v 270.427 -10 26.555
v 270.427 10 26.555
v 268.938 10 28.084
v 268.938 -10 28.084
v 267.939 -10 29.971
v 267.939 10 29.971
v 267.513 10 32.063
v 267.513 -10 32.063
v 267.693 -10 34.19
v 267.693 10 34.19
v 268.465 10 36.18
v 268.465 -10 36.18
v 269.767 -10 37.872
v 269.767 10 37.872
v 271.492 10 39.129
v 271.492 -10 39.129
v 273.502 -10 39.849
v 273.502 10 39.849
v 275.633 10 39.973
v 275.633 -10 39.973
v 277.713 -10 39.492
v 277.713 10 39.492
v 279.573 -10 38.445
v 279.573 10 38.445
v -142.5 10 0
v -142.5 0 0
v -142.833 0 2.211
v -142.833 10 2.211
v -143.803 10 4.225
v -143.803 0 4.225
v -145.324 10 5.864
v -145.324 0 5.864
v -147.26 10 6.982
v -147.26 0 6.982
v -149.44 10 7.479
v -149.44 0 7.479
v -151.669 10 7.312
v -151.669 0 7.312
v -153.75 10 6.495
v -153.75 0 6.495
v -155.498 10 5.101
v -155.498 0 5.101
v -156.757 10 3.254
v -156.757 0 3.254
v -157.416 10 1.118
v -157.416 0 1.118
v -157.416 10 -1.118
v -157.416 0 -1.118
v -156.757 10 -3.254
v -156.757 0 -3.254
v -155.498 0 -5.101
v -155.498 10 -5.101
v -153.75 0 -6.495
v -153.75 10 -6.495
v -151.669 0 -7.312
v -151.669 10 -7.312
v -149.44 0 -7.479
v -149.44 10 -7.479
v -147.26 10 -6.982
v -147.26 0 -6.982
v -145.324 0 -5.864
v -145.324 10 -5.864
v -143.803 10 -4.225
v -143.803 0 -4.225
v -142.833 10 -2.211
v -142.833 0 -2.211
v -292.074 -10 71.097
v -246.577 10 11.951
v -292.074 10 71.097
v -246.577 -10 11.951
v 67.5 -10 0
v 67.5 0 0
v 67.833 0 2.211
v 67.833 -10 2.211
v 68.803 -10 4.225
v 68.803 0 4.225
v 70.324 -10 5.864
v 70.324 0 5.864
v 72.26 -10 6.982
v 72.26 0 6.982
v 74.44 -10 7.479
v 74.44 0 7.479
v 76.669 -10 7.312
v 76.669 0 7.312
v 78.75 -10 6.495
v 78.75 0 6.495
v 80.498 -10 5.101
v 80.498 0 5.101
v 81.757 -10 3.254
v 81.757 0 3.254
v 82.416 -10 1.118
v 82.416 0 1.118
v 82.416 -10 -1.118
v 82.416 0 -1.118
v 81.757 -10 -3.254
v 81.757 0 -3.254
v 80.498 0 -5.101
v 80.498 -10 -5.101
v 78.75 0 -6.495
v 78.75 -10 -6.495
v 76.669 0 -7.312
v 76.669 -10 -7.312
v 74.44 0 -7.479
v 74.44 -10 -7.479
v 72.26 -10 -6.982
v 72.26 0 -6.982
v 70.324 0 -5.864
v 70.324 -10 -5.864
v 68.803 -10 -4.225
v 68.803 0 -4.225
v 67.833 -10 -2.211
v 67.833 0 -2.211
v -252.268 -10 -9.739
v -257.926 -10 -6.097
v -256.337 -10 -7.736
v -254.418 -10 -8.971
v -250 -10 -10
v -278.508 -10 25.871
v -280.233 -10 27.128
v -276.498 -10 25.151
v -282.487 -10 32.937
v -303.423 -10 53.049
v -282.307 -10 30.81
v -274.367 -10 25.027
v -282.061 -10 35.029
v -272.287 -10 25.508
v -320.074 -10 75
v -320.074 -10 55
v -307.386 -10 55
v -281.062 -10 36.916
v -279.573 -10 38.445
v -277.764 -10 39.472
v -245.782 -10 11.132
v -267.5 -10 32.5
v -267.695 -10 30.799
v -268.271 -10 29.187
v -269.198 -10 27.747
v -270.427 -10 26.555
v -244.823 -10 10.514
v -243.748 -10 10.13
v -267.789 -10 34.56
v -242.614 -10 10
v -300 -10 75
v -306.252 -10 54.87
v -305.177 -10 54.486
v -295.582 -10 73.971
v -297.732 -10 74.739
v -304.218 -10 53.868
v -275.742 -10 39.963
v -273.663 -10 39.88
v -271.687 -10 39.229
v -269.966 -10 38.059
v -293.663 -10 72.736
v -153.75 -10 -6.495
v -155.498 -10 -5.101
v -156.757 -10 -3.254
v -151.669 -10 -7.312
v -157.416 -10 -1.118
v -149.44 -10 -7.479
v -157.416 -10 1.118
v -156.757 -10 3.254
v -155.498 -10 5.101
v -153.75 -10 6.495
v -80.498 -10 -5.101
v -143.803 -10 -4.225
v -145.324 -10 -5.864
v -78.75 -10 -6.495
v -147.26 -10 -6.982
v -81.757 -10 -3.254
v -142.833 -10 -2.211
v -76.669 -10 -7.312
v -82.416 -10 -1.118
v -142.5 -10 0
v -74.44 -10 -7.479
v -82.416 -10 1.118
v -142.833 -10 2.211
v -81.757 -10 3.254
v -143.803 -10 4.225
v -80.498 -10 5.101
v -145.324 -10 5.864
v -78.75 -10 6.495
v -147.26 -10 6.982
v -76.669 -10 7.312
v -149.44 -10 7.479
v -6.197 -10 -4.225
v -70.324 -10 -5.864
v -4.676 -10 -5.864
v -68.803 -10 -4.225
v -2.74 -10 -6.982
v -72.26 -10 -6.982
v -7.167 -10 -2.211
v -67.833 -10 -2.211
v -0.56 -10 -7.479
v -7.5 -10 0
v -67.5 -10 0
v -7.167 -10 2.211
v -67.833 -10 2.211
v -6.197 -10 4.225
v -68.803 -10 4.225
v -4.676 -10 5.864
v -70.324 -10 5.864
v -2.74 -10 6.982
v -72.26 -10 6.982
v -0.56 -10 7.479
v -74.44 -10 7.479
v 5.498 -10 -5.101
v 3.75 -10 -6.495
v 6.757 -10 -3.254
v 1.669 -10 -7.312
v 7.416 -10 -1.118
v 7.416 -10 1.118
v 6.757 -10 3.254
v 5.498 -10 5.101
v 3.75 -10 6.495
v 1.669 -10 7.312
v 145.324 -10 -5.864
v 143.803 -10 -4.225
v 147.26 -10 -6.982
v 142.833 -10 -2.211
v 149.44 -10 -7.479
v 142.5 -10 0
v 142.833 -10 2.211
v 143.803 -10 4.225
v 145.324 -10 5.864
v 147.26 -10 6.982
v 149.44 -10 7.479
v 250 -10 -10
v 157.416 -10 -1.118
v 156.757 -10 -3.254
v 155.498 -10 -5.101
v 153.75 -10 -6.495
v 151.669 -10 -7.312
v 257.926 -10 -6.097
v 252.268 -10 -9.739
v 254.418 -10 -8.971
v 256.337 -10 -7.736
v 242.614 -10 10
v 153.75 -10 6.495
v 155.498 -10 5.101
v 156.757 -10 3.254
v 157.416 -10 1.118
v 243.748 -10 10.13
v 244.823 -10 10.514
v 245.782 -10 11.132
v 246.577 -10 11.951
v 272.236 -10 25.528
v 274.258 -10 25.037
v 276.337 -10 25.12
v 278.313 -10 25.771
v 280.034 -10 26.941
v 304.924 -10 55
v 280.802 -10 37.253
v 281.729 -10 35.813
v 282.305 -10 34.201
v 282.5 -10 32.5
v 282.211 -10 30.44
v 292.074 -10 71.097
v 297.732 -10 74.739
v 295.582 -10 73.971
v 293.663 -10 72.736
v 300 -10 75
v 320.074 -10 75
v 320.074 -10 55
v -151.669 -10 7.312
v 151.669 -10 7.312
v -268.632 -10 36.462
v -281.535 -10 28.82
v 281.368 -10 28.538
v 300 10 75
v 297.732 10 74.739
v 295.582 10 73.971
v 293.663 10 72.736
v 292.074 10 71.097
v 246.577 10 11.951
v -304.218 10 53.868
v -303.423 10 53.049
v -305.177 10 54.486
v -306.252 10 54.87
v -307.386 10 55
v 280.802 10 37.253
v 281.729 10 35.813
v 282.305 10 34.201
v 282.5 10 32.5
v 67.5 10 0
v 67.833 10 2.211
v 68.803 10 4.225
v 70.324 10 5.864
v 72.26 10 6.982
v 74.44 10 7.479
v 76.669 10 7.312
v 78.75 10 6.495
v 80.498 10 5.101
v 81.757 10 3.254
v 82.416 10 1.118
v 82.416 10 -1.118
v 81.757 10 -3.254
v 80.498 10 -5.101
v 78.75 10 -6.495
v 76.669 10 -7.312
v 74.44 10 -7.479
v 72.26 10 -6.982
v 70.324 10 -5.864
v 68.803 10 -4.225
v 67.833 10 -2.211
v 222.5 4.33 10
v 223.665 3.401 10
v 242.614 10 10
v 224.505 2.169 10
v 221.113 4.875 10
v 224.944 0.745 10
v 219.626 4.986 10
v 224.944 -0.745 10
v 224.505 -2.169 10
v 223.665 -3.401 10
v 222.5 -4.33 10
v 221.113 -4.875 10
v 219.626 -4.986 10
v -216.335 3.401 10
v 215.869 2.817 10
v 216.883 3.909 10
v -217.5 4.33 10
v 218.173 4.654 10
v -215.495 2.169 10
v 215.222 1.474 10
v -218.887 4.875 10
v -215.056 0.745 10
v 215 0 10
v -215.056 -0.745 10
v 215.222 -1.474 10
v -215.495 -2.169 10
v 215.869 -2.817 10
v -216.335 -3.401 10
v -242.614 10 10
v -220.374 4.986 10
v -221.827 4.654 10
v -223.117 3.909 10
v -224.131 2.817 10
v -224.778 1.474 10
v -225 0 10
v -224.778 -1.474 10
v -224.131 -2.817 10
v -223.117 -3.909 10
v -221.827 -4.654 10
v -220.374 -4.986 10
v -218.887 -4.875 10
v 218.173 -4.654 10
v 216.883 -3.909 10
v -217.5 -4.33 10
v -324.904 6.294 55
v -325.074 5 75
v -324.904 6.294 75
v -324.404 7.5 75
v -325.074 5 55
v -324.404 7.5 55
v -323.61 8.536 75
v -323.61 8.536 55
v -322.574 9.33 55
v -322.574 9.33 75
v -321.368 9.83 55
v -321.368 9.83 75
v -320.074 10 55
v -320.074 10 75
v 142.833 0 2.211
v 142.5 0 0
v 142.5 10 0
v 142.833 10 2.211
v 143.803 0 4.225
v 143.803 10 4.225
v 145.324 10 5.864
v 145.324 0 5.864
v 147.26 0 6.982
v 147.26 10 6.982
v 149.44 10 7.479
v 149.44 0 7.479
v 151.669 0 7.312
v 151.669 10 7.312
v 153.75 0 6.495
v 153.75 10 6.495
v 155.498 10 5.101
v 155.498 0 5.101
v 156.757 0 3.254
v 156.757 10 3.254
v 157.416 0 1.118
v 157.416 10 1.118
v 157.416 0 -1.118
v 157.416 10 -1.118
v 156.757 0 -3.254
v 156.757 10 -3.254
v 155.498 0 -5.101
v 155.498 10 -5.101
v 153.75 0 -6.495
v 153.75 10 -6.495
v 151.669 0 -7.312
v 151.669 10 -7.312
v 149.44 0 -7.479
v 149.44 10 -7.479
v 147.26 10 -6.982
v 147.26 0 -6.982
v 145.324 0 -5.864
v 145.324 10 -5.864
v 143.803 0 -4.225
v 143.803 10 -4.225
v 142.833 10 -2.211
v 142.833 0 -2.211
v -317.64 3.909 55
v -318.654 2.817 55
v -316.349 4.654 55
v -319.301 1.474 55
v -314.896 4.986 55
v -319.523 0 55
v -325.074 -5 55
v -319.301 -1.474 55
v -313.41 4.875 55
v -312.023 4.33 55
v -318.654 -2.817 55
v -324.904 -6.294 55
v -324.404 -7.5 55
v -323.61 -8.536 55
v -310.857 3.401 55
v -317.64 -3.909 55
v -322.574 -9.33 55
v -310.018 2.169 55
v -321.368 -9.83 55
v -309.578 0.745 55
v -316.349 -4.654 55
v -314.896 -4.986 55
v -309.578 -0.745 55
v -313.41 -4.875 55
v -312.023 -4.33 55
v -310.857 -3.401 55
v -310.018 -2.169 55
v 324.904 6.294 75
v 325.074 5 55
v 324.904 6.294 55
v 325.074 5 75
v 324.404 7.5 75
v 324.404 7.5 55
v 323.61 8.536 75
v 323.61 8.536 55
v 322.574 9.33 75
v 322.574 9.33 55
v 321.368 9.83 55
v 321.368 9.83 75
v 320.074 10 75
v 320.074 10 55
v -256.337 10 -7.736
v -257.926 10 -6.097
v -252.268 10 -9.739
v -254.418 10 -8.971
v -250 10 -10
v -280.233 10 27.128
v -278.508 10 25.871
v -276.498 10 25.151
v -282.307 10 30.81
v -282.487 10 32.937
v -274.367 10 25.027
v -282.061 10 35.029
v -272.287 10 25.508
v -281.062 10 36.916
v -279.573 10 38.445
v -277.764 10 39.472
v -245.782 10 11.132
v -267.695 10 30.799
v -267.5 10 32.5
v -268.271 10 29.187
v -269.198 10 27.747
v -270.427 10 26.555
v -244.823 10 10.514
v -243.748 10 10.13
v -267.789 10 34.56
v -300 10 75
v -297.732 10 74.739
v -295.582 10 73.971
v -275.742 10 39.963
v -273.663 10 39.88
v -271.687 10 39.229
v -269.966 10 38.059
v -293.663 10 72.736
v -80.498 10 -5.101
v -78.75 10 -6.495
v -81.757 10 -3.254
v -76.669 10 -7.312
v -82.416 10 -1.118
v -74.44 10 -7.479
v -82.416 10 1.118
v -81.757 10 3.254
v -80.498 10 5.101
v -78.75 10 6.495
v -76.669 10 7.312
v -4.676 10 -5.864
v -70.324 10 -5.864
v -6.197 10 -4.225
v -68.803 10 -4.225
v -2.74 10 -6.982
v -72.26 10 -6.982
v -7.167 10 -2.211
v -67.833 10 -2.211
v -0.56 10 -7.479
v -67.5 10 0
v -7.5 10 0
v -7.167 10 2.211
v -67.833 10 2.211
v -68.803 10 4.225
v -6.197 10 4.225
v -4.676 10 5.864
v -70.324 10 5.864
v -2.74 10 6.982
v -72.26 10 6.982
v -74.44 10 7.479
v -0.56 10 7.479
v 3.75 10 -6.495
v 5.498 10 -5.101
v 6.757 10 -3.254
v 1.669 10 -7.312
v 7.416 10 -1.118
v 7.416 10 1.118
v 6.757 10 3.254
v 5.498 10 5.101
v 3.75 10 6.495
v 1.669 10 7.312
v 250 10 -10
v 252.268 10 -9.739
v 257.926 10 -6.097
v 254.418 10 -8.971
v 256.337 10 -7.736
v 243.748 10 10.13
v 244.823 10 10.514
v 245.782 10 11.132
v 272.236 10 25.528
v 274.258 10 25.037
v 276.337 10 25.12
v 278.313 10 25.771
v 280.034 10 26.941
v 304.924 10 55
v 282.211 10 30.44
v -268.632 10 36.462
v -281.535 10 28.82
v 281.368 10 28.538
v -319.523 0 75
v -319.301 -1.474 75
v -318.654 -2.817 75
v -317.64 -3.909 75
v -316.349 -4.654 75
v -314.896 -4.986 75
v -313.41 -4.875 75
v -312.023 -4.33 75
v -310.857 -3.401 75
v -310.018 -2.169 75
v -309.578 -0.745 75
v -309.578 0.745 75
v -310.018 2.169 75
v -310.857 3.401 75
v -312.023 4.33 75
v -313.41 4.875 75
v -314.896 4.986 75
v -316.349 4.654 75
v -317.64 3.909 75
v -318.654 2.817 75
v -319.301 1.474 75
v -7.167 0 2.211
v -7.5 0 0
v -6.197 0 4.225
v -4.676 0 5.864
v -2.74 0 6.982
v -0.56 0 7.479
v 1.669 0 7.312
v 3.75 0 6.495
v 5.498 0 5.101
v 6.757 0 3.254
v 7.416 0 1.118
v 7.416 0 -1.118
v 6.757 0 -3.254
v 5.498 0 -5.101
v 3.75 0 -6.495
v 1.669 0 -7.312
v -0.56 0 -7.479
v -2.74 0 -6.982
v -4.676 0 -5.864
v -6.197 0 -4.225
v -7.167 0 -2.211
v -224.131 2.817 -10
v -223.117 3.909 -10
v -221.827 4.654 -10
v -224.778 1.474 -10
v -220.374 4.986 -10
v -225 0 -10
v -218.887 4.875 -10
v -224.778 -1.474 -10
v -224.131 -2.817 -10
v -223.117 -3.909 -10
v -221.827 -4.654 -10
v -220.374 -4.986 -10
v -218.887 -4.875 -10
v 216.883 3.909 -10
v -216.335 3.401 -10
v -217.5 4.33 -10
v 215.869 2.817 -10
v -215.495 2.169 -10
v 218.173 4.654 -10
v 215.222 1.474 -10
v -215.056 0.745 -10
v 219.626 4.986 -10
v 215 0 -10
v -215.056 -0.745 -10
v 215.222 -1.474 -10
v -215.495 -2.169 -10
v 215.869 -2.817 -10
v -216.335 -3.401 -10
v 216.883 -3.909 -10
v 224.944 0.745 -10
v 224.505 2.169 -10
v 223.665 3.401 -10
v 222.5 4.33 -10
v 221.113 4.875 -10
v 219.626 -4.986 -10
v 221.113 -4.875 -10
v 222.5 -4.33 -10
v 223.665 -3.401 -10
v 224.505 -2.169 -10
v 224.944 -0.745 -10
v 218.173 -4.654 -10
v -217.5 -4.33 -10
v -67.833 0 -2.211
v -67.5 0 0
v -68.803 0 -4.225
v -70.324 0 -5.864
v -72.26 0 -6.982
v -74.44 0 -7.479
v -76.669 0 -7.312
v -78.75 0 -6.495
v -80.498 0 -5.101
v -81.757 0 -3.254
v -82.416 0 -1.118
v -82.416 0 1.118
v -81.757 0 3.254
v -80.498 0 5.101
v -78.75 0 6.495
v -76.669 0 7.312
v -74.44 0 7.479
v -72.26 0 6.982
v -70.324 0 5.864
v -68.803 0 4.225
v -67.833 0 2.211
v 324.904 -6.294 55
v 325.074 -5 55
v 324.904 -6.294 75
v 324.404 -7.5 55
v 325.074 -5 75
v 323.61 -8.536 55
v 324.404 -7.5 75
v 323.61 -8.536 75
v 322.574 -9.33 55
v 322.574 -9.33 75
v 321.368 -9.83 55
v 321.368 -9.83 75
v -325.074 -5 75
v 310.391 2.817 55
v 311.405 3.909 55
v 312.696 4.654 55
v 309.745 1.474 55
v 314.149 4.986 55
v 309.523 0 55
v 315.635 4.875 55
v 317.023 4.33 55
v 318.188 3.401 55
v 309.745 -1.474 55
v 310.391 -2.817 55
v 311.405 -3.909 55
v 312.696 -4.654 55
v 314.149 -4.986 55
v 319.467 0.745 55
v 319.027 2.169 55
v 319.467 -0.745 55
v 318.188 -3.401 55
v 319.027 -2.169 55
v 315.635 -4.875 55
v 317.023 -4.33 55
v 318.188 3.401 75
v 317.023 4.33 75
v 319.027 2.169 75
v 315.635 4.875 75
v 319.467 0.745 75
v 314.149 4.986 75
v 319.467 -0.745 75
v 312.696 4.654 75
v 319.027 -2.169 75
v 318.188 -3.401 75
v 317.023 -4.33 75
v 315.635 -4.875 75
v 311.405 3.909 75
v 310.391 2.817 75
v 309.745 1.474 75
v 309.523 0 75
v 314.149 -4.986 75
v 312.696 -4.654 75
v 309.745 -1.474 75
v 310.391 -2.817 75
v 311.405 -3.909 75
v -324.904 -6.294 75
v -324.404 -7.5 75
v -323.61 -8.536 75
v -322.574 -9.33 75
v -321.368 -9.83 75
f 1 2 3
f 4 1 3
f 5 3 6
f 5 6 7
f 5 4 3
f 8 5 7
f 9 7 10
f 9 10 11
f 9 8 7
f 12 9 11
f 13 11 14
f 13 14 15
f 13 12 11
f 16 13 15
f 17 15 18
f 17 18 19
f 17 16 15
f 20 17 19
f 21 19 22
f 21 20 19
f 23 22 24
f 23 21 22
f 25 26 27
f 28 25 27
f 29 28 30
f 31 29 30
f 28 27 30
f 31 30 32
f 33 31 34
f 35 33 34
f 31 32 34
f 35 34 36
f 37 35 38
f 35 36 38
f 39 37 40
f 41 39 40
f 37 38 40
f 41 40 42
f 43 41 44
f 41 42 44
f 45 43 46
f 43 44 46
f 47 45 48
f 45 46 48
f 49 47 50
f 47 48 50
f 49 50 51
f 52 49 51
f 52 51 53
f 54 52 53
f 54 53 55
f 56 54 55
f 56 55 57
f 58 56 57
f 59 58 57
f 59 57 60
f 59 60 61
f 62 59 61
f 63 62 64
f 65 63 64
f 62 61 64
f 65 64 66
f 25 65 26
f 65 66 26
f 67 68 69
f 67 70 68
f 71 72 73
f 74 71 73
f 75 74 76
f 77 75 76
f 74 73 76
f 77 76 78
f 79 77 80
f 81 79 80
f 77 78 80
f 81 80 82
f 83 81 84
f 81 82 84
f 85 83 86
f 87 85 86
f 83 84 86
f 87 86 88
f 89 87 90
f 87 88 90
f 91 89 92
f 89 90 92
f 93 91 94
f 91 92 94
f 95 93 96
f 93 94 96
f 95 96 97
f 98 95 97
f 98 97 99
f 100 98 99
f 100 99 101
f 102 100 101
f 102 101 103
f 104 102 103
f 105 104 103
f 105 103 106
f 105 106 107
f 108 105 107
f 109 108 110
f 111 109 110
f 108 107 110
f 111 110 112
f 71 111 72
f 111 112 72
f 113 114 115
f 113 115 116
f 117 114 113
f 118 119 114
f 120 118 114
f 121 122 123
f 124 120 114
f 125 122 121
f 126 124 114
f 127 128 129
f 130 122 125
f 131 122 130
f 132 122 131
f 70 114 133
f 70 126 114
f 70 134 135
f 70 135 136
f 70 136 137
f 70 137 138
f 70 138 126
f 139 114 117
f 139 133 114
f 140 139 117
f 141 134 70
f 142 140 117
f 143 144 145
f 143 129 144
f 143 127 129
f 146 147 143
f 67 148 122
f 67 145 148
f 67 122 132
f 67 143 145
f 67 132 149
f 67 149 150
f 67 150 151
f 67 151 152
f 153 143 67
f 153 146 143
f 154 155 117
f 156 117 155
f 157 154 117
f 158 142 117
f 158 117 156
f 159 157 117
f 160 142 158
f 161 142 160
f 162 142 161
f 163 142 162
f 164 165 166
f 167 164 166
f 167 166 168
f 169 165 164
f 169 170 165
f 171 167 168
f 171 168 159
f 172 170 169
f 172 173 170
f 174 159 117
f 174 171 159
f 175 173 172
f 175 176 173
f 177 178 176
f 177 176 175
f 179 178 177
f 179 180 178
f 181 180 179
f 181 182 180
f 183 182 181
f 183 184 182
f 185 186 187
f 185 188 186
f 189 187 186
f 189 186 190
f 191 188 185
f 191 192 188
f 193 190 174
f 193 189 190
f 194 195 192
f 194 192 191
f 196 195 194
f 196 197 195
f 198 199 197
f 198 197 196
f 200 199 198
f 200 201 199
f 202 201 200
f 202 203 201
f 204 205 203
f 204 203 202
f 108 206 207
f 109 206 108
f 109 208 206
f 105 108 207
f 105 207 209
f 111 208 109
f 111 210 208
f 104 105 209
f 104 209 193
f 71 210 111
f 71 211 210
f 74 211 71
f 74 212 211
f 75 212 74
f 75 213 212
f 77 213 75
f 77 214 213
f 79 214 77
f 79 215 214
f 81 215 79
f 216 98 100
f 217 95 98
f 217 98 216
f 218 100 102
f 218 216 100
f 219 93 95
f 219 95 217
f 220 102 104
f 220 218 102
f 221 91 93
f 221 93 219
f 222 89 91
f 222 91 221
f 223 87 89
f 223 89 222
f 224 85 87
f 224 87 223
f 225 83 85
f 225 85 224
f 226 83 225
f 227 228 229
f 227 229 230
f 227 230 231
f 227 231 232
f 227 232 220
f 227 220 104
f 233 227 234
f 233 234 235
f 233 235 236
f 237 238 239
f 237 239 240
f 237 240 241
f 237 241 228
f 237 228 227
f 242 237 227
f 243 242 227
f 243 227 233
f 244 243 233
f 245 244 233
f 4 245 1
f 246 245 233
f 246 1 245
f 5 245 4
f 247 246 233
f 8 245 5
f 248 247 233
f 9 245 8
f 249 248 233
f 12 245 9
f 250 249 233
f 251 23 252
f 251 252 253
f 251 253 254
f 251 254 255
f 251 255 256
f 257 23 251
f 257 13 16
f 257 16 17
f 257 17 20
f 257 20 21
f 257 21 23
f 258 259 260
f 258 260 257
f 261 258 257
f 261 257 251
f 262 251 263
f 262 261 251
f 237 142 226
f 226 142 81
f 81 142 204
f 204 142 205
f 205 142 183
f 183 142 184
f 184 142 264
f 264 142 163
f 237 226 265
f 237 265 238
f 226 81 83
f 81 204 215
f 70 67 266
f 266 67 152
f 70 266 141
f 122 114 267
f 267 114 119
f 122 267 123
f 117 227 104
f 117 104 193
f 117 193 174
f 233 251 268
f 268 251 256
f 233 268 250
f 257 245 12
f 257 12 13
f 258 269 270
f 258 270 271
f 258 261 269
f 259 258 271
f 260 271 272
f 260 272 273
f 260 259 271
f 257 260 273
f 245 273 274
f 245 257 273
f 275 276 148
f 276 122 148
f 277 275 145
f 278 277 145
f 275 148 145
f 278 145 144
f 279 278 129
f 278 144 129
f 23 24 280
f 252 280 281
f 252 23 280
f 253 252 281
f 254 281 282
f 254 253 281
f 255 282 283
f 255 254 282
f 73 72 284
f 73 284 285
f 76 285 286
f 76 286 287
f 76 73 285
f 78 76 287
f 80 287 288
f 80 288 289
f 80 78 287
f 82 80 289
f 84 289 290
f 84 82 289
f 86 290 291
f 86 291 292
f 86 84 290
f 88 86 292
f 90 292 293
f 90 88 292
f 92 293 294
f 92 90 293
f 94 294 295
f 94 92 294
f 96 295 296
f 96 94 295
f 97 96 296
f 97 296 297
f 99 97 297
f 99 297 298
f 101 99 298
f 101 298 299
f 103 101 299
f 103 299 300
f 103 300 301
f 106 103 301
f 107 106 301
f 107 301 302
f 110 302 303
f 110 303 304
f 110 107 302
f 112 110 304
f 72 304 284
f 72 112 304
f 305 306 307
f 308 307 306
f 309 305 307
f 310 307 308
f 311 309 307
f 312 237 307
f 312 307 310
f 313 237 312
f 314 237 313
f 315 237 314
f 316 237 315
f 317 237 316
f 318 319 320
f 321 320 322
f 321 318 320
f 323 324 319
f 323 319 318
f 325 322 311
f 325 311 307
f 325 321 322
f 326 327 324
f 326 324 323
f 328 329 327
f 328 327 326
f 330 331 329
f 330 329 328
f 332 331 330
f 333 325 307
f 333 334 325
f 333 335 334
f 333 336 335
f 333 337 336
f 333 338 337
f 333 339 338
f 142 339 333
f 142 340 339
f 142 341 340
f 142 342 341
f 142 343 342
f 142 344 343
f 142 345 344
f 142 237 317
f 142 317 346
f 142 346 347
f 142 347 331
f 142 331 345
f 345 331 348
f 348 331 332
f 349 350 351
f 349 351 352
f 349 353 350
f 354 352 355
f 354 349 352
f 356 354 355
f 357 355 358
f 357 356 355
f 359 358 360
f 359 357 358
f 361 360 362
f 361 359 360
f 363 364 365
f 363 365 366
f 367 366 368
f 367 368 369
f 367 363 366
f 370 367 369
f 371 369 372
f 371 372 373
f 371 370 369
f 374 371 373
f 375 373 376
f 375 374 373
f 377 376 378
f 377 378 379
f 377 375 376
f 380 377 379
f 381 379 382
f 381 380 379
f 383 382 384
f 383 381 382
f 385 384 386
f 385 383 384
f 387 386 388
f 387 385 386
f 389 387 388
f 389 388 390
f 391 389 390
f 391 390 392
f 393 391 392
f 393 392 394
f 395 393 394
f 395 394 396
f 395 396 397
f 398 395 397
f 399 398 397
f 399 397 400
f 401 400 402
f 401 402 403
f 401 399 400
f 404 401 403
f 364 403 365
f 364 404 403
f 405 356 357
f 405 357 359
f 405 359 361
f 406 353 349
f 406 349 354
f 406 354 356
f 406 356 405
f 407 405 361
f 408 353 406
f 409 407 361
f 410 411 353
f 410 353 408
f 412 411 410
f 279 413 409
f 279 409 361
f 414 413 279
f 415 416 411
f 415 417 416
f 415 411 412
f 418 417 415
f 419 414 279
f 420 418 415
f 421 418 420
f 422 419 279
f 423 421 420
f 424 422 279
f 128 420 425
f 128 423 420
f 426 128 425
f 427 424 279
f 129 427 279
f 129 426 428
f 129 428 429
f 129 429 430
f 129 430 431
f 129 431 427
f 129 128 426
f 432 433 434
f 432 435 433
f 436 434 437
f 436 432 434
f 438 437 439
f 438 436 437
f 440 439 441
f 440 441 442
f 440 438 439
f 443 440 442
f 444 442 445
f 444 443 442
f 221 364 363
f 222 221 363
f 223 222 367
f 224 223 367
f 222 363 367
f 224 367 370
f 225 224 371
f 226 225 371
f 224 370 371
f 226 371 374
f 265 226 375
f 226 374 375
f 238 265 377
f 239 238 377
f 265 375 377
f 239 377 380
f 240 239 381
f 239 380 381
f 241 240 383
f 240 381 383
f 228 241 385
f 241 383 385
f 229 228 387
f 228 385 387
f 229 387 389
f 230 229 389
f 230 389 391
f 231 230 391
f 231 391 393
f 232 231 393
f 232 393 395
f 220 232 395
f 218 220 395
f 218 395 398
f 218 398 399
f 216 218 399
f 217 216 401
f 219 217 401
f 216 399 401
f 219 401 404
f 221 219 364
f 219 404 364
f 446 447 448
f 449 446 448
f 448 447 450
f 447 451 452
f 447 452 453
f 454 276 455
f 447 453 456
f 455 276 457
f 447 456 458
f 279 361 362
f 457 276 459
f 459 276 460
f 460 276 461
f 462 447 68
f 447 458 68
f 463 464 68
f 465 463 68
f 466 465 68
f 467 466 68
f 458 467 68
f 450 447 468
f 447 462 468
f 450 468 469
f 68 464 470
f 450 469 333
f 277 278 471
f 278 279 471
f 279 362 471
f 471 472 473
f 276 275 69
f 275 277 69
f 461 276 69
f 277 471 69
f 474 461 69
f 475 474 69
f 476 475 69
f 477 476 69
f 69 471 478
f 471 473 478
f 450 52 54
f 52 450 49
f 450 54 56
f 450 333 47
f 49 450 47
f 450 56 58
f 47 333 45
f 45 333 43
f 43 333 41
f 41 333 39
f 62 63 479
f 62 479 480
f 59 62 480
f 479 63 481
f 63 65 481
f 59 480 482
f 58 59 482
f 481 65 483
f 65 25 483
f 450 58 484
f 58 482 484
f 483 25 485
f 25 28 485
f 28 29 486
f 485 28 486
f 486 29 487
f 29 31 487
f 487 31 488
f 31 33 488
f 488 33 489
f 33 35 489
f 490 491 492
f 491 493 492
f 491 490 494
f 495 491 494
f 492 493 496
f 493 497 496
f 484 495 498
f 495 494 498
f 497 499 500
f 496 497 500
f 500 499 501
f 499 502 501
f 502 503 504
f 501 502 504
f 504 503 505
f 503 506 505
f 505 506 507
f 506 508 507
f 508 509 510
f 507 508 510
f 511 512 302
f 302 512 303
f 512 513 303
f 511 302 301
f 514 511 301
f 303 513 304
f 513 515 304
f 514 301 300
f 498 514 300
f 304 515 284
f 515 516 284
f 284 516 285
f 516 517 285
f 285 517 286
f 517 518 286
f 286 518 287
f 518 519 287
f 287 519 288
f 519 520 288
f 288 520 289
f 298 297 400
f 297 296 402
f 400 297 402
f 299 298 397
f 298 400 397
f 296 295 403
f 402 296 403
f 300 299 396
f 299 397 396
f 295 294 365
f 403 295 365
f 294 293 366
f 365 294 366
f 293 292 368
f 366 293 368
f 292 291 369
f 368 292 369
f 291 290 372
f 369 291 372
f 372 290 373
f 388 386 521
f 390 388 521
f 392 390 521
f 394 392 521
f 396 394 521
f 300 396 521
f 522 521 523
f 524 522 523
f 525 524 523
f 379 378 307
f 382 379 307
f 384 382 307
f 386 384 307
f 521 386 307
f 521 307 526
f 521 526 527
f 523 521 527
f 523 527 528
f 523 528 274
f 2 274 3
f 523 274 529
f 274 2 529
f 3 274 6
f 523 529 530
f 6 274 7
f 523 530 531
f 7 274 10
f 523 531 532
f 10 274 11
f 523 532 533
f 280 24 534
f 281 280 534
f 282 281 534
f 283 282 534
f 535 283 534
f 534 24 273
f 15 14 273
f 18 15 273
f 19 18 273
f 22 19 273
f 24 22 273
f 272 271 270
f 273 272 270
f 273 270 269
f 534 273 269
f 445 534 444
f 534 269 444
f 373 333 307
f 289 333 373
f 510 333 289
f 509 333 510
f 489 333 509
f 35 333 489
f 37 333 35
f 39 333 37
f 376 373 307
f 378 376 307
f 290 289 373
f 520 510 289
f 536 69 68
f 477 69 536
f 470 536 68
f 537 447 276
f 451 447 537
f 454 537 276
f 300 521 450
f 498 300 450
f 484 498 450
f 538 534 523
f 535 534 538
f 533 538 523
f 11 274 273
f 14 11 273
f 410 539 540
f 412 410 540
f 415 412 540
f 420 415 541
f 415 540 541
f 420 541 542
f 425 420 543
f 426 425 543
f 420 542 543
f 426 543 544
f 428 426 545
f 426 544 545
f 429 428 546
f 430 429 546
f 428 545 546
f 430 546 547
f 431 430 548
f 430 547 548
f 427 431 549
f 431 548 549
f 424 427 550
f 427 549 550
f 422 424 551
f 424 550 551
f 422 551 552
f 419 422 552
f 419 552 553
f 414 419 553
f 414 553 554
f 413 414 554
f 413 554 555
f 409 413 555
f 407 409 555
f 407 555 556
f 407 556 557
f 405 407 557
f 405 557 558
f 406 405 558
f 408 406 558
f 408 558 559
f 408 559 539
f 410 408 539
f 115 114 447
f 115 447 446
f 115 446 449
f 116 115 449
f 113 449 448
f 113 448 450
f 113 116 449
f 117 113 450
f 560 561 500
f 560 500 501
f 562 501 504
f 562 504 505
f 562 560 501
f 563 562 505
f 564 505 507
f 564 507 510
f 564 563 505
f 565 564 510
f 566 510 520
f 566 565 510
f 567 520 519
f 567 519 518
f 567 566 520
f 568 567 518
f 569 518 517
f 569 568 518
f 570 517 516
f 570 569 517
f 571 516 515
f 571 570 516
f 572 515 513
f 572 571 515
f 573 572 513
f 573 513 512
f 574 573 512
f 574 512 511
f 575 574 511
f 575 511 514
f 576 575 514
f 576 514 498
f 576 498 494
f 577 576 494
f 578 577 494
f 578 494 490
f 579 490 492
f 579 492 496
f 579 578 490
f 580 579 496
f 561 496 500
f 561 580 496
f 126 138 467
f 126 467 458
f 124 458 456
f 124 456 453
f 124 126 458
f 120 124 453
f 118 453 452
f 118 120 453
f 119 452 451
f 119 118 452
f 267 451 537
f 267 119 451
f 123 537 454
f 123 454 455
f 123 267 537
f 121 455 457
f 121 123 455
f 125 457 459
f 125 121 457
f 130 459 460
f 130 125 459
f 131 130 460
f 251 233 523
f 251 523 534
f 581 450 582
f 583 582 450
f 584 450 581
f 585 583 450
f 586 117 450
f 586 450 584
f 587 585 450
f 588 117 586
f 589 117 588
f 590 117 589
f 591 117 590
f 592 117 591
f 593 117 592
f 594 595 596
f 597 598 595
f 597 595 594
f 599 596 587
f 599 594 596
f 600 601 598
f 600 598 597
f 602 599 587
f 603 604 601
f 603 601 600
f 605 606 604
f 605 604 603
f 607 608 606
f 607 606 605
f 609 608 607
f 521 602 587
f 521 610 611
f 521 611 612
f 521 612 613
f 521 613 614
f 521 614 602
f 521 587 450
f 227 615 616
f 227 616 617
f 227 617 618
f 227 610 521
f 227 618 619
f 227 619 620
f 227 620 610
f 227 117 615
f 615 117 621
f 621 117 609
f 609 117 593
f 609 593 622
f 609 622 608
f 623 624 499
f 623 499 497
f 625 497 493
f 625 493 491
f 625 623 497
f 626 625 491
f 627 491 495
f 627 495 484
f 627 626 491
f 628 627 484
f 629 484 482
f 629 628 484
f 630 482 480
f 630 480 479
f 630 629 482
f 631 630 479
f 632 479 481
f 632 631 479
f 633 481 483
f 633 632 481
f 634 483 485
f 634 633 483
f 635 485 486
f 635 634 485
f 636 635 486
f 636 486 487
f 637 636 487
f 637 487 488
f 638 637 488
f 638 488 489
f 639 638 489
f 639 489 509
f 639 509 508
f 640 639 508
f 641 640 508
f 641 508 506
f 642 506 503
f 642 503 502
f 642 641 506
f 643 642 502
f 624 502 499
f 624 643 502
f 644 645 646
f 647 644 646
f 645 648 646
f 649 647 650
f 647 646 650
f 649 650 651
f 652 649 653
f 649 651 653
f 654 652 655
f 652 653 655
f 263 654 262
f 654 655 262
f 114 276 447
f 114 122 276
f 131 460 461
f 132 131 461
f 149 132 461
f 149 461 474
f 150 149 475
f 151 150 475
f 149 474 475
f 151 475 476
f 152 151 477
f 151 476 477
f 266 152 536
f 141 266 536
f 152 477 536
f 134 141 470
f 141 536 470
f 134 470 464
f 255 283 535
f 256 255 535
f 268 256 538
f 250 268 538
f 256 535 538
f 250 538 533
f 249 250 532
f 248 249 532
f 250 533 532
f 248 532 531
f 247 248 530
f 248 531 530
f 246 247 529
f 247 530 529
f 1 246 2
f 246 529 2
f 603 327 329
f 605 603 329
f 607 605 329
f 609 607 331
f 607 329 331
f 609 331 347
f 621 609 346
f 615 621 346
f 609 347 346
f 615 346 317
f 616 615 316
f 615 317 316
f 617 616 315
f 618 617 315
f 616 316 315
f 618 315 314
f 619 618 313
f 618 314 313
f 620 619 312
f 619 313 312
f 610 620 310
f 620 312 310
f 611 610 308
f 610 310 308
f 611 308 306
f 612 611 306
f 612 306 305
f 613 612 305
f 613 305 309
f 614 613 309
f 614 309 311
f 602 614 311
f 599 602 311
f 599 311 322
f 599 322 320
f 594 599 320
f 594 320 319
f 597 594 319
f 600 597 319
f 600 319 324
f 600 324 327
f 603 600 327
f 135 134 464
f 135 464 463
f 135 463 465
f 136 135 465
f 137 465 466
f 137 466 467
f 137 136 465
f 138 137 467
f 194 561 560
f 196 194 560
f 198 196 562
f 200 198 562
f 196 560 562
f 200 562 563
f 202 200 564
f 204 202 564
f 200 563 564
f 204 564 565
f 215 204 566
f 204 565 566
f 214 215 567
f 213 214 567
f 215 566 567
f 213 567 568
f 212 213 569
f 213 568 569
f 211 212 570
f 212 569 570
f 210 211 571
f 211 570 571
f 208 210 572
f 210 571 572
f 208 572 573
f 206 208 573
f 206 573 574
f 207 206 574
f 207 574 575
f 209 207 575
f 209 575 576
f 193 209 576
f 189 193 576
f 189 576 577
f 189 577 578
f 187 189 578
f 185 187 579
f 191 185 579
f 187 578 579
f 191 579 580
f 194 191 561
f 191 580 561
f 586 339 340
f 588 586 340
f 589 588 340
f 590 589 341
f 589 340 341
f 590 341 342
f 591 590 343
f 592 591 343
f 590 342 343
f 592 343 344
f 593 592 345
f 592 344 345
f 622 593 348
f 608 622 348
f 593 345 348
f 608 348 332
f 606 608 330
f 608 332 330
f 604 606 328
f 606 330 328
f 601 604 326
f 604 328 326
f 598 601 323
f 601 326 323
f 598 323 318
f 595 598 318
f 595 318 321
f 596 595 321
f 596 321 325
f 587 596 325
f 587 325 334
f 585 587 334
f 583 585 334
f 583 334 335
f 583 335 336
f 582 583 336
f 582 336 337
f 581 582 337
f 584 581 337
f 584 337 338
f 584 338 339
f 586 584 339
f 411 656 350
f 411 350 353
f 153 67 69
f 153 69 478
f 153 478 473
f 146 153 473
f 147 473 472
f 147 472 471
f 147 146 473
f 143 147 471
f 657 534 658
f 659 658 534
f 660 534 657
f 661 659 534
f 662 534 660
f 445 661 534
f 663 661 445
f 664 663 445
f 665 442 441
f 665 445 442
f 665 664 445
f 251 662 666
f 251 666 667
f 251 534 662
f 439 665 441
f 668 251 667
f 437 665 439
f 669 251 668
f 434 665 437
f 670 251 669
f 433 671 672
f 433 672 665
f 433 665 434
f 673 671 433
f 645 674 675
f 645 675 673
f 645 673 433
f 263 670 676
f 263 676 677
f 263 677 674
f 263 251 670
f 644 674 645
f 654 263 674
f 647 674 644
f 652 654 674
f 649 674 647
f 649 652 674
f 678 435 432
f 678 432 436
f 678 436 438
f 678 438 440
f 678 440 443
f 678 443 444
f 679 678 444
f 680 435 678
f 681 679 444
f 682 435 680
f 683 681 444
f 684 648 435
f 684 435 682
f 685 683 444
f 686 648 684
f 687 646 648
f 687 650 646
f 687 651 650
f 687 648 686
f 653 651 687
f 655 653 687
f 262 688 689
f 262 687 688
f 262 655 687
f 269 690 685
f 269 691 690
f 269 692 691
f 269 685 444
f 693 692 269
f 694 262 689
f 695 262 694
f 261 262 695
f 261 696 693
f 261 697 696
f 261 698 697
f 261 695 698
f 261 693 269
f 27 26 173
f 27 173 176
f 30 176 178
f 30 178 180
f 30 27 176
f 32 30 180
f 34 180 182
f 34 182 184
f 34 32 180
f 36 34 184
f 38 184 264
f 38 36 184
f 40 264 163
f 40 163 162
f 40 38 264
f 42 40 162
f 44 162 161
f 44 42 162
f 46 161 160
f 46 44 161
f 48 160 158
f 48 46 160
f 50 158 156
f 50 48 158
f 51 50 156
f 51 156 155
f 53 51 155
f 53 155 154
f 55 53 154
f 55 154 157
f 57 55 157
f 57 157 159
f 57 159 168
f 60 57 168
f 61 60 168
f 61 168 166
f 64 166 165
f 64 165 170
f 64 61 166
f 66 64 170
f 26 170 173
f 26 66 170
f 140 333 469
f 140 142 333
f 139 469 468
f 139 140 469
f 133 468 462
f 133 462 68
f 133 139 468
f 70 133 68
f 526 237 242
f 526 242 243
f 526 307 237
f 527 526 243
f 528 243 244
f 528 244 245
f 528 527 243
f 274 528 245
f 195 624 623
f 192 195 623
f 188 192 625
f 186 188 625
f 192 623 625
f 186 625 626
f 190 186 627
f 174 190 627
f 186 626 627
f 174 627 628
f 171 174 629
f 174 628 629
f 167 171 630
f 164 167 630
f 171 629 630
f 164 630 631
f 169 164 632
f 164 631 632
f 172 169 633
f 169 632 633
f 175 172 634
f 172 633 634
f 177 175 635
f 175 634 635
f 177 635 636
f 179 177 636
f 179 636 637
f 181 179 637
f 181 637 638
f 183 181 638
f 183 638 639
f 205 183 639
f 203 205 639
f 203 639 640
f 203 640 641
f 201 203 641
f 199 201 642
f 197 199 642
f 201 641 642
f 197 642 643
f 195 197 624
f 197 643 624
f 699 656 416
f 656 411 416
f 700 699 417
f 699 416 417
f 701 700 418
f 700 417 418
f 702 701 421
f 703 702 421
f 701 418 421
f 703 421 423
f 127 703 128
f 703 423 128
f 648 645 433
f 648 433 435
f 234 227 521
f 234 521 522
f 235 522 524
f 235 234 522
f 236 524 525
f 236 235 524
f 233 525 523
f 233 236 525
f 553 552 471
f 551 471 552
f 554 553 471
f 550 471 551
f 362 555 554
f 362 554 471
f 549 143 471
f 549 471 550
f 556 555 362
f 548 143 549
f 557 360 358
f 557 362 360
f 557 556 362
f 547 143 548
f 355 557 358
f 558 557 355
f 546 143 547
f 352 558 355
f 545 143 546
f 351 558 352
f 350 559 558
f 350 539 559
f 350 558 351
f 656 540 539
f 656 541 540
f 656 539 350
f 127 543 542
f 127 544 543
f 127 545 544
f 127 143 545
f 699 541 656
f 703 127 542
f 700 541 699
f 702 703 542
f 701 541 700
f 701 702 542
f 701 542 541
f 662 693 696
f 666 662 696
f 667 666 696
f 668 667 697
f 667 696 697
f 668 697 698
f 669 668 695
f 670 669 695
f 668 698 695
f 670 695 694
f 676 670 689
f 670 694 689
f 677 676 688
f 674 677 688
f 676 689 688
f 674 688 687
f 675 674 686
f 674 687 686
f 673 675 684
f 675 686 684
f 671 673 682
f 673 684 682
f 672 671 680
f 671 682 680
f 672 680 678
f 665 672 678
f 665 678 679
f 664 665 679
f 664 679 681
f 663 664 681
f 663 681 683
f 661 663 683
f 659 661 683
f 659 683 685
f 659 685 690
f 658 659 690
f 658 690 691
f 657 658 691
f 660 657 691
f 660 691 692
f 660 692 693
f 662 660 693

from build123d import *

# Parameters (mm, degrees)
F0_R     = 7.5
F1_DEPTH = 10
F2_R     = 5
F5_D     = 10


with BuildPart() as f1:
    # F0 (on Front) → F1 (new body, symmetric)
    with BuildSketch(Plane.XZ):
        with BuildLine():
            Line((0, 10), (-245.075985, 10))
            Line((-245.075985, 10), (-242.07376, 6.097108))
            ThreePointArc((-242.07376, 6.097108), (-241.028627, -4.417518), (-250, -10))
            Line((-250, -10), (0, -10))
            Line((0, -10), (250, -10))
            ThreePointArc((250, -10), (241.028627, -4.417518), (242.07376, 6.097108))
            Line((242.07376, 6.097108), (245.075985, 10))
            Line((245.075985, 10), (0, 10))
        make_face()
        with Locations((-150, 0)):
            Circle(F0_R, mode=Mode.SUBTRACT)
        with BuildLine():
            ThreePointArc((-82.5, 0), (-75, 7.5), (-67.5, 0))
            ThreePointArc((-67.5, 0), (-75, -7.5), (-82.5, 0))
        make_face(mode=Mode.SUBTRACT)
        with BuildLine():
            ThreePointArc((7.5, 0), (0, -7.5), (-7.5, 0))
            ThreePointArc((-7.5, 0), (0, 7.5), (7.5, 0))
        make_face(mode=Mode.SUBTRACT)
        with BuildLine():
            ThreePointArc((82.5, 0), (75, -7.5), (67.5, 0))
            ThreePointArc((67.5, 0), (75, 7.5), (82.5, 0))
        make_face(mode=Mode.SUBTRACT)
        with BuildLine():
            ThreePointArc((157.5, 0), (150, -7.5), (142.5, 0))
            ThreePointArc((142.5, 0), (150, 7.5), (157.5, 0))
        make_face(mode=Mode.SUBTRACT)
        with BuildLine():
            ThreePointArc((-300, 75), (-308.971373, 69.417518), (-307.92624, 58.902892))
            Line((-307.92624, 58.902892), (-304.924015, 55))
            Line((-304.924015, 55), (-257.92624, -6.097108))
            ThreePointArc((-257.92624, -6.097108), (-254.417518, -8.971373), (-250, -10))
            ThreePointArc((-250, -10), (-241.028627, -4.417518), (-242.07376, 6.097108))
            Line((-242.07376, 6.097108), (-245.075985, 10))
            Line((-245.075985, 10), (-292.07376, 71.097108))
            ThreePointArc((-292.07376, 71.097108), (-295.582482, 73.971373), (-300, 75))
        make_face()
        with BuildLine():
            ThreePointArc((-270.427169, 26.55532), (-280.94468, 27.927169), (-279.572831, 38.44468))
            ThreePointArc((-279.572831, 38.44468), (-271.686862, 39.22853), (-267.5, 32.5))
            ThreePointArc((-267.5, 32.5), (-268.27147, 29.186862), (-270.427169, 26.55532))
        make_face(mode=Mode.SUBTRACT)
        with BuildLine():
            Line((-304.924015, 55), (-307.92624, 58.902892))
            ThreePointArc((-307.92624, 58.902892), (-308.971373, 69.417518), (-300, 75))
            Line((-300, 75), (-320, 75))
            Line((-320, 75), (-325.074017, 75))
            Line((-325.074017, 75), (-325.074017, 55))
            Line((-325.074017, 55), (-320, 55))
            Line((-320, 55), (-319.222152, 55))
            Line((-319.222152, 55), (-304.924015, 55))
        make_face()
        with BuildLine():
            Line((292.07376, 71.097108), (245.075985, 10))
            Line((245.075985, 10), (242.07376, 6.097108))
            ThreePointArc((242.07376, 6.097108), (241.028627, -4.417518), (250, -10))
            ThreePointArc((250, -10), (254.417518, -8.971373), (257.92624, -6.097108))
            Line((257.92624, -6.097108), (304.924015, 55))
            Line((304.924015, 55), (307.92624, 58.902892))
            ThreePointArc((307.92624, 58.902892), (308.971373, 69.417518), (300, 75))
            ThreePointArc((300, 75), (295.582482, 73.971373), (292.07376, 71.097108))
        make_face()
        with BuildLine():
            ThreePointArc((279.572831, 38.44468), (281.72853, 35.813138), (282.5, 32.5))
            ThreePointArc((282.5, 32.5), (278.313138, 25.77147), (270.427169, 26.55532))
            ThreePointArc((270.427169, 26.55532), (269.05532, 37.072831), (279.572831, 38.44468))
        make_face(mode=Mode.SUBTRACT)
        with BuildLine():
            Line((320, 75), (300, 75))
            ThreePointArc((300, 75), (308.971373, 69.417518), (307.92624, 58.902892))
            Line((307.92624, 58.902892), (304.924015, 55))
            Line((304.924015, 55), (319.222152, 55))
            Line((319.222152, 55), (320, 55))
            Line((320, 55), (325.074017, 55))
            Line((325.074017, 55), (325.074017, 75))
            Line((325.074017, 75), (320, 75))
        make_face()
    extrude(amount=F1_DEPTH, both=True)

    # F2
    f2_edges = [f1.edges().sort_by_distance(p)[0] for p in [
        (-245.075985, 0, 10),
        (245.075985, 0, 10),
        (-304.924015, 0, 55),
        (-325.074017, 10, 65),
        (325.074017, -10, 65),
        (325.074017, 10, 65),
        (-325.074017, -10, 65),
    ]]
    fillet(f2_edges, radius=F2_R)

    # F5 (through all)
    with Locations(Plane(origin=(0, 0, -10), x_dir=(1, 0, 0), z_dir=(0, 0, -1))):
        with Locations((-220, 0), (220, 0), (314.522654, 0), (-314.522654, 0)):
            Hole(F5_D / 2)


solid = f1.part
